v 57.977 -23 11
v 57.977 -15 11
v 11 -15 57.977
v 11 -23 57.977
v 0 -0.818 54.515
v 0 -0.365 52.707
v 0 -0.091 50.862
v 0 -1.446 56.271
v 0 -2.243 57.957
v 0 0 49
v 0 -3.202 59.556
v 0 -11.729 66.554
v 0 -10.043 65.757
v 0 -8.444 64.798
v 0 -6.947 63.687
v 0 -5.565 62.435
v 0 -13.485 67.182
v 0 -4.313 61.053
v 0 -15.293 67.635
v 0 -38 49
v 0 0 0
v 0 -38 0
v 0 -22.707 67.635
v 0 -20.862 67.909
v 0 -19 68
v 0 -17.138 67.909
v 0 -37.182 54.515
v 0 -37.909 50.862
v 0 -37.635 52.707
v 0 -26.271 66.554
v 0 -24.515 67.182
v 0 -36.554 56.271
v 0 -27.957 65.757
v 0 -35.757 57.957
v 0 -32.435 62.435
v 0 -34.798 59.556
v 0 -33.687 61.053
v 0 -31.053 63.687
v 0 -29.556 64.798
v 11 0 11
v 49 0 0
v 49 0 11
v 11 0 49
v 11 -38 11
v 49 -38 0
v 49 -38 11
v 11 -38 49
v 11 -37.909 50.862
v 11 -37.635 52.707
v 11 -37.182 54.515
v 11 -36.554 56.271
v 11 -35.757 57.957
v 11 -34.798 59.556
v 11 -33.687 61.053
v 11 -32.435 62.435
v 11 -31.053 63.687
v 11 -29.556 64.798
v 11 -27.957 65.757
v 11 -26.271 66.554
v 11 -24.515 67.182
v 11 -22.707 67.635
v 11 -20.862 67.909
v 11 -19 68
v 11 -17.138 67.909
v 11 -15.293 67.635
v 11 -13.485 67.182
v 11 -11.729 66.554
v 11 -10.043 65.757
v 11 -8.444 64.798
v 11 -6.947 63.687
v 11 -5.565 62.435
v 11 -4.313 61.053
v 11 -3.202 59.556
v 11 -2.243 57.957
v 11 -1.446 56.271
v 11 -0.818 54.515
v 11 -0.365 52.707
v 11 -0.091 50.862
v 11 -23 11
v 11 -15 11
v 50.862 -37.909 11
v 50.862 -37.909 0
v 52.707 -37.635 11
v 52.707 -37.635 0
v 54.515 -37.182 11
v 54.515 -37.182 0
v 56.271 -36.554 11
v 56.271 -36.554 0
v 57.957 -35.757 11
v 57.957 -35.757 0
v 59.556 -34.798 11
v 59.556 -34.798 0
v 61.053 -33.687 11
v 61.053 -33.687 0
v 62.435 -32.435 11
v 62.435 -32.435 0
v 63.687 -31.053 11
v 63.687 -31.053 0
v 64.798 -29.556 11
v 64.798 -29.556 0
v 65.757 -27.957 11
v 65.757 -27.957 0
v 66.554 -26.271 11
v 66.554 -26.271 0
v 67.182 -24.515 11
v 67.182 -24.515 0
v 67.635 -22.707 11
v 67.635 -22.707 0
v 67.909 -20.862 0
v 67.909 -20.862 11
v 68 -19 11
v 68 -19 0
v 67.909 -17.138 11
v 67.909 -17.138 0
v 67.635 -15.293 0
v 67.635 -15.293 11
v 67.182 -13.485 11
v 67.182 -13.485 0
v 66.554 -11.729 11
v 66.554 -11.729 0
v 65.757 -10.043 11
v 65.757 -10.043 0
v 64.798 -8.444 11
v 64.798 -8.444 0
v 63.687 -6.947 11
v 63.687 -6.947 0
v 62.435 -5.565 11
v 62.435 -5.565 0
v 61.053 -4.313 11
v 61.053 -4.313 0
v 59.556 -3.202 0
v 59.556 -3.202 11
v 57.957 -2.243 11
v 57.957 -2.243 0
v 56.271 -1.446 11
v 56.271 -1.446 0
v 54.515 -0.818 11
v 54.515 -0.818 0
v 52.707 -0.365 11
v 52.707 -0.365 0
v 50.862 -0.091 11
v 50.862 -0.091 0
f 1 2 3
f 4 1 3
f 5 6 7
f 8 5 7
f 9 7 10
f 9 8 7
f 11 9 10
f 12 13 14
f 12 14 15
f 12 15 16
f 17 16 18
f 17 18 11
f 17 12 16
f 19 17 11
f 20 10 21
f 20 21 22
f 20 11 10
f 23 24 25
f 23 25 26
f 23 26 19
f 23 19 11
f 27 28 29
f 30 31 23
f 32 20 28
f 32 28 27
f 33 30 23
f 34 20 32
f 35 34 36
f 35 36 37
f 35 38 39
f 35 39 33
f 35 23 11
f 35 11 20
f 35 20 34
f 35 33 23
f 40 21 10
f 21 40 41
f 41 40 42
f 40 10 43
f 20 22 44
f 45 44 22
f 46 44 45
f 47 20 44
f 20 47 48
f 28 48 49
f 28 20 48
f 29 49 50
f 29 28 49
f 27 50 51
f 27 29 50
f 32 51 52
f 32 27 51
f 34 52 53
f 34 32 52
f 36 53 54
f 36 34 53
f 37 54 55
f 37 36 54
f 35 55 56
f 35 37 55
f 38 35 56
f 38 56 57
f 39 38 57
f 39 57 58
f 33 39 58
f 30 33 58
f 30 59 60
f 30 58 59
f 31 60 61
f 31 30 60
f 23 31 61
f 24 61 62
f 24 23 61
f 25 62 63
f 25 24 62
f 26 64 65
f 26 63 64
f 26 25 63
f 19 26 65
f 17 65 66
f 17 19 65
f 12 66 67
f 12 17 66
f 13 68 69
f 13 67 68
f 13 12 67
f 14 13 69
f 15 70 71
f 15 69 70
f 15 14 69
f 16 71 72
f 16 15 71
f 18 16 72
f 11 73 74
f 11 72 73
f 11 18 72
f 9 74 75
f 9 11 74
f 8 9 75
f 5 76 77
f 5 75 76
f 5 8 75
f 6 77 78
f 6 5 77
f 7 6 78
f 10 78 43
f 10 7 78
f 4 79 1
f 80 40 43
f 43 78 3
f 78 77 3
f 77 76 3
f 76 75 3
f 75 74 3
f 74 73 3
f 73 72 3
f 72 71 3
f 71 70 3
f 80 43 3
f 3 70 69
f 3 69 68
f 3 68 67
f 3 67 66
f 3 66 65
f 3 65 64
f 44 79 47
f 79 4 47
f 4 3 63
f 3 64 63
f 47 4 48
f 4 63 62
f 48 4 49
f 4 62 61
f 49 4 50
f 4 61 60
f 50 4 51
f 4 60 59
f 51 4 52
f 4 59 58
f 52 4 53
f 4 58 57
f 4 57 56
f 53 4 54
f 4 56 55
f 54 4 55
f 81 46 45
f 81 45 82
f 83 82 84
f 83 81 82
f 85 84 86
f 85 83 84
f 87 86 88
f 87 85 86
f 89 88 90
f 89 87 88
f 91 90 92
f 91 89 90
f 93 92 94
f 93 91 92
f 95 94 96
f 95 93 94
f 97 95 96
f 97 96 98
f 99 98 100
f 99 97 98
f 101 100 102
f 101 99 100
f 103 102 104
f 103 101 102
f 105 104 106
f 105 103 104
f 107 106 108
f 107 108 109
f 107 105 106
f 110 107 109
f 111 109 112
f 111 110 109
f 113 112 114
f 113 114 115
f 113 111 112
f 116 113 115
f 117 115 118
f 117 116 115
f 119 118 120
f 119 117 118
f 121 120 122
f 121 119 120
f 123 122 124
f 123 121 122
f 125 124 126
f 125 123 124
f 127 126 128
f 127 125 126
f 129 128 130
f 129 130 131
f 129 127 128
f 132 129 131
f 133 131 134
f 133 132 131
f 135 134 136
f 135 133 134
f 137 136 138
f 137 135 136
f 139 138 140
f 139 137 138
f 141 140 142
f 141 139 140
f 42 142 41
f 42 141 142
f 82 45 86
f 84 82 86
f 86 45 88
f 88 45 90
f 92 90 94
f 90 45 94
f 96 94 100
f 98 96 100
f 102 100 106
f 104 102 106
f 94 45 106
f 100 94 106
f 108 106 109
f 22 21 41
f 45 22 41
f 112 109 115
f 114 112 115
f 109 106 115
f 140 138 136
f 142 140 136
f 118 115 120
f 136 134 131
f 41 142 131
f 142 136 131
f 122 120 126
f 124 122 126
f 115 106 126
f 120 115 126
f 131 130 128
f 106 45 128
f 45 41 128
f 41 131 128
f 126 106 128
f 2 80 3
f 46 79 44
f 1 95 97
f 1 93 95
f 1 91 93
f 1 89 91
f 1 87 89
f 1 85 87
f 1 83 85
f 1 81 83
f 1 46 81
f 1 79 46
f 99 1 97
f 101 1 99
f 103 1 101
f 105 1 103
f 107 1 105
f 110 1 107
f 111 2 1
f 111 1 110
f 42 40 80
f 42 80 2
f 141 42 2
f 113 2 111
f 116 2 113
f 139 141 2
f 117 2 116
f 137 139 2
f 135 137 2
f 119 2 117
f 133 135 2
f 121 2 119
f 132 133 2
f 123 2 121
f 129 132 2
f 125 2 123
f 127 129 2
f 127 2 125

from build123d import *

# Parameters (mm, degrees)
F1_DEPTH    = 38
F3_DEPTH    = 11
F5_DEPTH    = 11
F6_W        = 8
F6_H        = 48.4886
F7_DEPTH    = 48.4886
F8_T4_DEPTH = 265.1682987966


# Not quite as in the source:
# - a fillet or chamfer that OpenCascade refuses, or shapes differently, is made with other operations: its cross-section is extruded or revolved along the edge and cut away or added


with BuildPart() as f1:
    # F0 (on Front) → F1 (new body)
    with BuildSketch(Plane.XZ):
        Polygon((0, 49), (0, 0), (49, 0), (49, 11), (11, 11), (11, 49), align=None)
    extrude(amount=F1_DEPTH)

    # F2 (on face) → F3 (join)
    with BuildSketch(Plane(origin=(0, 0, 0), x_dir=(0, -1, 0), z_dir=(-1, 0, 0))):
        with BuildLine():
            Line((0, 49), (38, 49))
            ThreePointArc((38, 49), (19, 68), (0, 49))
        make_face()
    extrude(amount=-F3_DEPTH)

    # F4 (on face) → F5 (join)
    with BuildSketch(Plane.XY.offset(11)):
        with BuildLine():
            Line((49, 0), (49, -38))
            ThreePointArc((49, -38), (68, -19), (49, 0))
        make_face()
    extrude(amount=-F5_DEPTH)

    # F6 (on face) → F7 (join)
    with BuildSketch(Plane.YZ.offset(11)):
        with Locations((-19, 35.2443)):
            Rectangle(F6_W, F6_H)
    extrude(amount=F7_DEPTH)

    # F8: chamfer of 50 on 1 edges, made by hand


with BuildPart() as f8_tool2:
    # F8_s3 → F8_t4 (new body)
    with BuildSketch(Plane.XZ.offset(-113.5841493983)):
        Polygon((59.4886, 9.4886), (9.4886, 59.4886), (59.4886, 59.4886), align=None)
    extrude(amount=F8_T4_DEPTH)

    split(bisect_by=Plane.XY.offset(11), keep=Keep.TOP)

    split(bisect_by=Plane.YZ.offset(11), keep=Keep.TOP)


with BuildPart() as f1_1:
    add(f1.part)

    # F8_t1: cut F8_tool2
    add(f8_tool2.part, mode=Mode.SUBTRACT)


solid = f1_1.part
